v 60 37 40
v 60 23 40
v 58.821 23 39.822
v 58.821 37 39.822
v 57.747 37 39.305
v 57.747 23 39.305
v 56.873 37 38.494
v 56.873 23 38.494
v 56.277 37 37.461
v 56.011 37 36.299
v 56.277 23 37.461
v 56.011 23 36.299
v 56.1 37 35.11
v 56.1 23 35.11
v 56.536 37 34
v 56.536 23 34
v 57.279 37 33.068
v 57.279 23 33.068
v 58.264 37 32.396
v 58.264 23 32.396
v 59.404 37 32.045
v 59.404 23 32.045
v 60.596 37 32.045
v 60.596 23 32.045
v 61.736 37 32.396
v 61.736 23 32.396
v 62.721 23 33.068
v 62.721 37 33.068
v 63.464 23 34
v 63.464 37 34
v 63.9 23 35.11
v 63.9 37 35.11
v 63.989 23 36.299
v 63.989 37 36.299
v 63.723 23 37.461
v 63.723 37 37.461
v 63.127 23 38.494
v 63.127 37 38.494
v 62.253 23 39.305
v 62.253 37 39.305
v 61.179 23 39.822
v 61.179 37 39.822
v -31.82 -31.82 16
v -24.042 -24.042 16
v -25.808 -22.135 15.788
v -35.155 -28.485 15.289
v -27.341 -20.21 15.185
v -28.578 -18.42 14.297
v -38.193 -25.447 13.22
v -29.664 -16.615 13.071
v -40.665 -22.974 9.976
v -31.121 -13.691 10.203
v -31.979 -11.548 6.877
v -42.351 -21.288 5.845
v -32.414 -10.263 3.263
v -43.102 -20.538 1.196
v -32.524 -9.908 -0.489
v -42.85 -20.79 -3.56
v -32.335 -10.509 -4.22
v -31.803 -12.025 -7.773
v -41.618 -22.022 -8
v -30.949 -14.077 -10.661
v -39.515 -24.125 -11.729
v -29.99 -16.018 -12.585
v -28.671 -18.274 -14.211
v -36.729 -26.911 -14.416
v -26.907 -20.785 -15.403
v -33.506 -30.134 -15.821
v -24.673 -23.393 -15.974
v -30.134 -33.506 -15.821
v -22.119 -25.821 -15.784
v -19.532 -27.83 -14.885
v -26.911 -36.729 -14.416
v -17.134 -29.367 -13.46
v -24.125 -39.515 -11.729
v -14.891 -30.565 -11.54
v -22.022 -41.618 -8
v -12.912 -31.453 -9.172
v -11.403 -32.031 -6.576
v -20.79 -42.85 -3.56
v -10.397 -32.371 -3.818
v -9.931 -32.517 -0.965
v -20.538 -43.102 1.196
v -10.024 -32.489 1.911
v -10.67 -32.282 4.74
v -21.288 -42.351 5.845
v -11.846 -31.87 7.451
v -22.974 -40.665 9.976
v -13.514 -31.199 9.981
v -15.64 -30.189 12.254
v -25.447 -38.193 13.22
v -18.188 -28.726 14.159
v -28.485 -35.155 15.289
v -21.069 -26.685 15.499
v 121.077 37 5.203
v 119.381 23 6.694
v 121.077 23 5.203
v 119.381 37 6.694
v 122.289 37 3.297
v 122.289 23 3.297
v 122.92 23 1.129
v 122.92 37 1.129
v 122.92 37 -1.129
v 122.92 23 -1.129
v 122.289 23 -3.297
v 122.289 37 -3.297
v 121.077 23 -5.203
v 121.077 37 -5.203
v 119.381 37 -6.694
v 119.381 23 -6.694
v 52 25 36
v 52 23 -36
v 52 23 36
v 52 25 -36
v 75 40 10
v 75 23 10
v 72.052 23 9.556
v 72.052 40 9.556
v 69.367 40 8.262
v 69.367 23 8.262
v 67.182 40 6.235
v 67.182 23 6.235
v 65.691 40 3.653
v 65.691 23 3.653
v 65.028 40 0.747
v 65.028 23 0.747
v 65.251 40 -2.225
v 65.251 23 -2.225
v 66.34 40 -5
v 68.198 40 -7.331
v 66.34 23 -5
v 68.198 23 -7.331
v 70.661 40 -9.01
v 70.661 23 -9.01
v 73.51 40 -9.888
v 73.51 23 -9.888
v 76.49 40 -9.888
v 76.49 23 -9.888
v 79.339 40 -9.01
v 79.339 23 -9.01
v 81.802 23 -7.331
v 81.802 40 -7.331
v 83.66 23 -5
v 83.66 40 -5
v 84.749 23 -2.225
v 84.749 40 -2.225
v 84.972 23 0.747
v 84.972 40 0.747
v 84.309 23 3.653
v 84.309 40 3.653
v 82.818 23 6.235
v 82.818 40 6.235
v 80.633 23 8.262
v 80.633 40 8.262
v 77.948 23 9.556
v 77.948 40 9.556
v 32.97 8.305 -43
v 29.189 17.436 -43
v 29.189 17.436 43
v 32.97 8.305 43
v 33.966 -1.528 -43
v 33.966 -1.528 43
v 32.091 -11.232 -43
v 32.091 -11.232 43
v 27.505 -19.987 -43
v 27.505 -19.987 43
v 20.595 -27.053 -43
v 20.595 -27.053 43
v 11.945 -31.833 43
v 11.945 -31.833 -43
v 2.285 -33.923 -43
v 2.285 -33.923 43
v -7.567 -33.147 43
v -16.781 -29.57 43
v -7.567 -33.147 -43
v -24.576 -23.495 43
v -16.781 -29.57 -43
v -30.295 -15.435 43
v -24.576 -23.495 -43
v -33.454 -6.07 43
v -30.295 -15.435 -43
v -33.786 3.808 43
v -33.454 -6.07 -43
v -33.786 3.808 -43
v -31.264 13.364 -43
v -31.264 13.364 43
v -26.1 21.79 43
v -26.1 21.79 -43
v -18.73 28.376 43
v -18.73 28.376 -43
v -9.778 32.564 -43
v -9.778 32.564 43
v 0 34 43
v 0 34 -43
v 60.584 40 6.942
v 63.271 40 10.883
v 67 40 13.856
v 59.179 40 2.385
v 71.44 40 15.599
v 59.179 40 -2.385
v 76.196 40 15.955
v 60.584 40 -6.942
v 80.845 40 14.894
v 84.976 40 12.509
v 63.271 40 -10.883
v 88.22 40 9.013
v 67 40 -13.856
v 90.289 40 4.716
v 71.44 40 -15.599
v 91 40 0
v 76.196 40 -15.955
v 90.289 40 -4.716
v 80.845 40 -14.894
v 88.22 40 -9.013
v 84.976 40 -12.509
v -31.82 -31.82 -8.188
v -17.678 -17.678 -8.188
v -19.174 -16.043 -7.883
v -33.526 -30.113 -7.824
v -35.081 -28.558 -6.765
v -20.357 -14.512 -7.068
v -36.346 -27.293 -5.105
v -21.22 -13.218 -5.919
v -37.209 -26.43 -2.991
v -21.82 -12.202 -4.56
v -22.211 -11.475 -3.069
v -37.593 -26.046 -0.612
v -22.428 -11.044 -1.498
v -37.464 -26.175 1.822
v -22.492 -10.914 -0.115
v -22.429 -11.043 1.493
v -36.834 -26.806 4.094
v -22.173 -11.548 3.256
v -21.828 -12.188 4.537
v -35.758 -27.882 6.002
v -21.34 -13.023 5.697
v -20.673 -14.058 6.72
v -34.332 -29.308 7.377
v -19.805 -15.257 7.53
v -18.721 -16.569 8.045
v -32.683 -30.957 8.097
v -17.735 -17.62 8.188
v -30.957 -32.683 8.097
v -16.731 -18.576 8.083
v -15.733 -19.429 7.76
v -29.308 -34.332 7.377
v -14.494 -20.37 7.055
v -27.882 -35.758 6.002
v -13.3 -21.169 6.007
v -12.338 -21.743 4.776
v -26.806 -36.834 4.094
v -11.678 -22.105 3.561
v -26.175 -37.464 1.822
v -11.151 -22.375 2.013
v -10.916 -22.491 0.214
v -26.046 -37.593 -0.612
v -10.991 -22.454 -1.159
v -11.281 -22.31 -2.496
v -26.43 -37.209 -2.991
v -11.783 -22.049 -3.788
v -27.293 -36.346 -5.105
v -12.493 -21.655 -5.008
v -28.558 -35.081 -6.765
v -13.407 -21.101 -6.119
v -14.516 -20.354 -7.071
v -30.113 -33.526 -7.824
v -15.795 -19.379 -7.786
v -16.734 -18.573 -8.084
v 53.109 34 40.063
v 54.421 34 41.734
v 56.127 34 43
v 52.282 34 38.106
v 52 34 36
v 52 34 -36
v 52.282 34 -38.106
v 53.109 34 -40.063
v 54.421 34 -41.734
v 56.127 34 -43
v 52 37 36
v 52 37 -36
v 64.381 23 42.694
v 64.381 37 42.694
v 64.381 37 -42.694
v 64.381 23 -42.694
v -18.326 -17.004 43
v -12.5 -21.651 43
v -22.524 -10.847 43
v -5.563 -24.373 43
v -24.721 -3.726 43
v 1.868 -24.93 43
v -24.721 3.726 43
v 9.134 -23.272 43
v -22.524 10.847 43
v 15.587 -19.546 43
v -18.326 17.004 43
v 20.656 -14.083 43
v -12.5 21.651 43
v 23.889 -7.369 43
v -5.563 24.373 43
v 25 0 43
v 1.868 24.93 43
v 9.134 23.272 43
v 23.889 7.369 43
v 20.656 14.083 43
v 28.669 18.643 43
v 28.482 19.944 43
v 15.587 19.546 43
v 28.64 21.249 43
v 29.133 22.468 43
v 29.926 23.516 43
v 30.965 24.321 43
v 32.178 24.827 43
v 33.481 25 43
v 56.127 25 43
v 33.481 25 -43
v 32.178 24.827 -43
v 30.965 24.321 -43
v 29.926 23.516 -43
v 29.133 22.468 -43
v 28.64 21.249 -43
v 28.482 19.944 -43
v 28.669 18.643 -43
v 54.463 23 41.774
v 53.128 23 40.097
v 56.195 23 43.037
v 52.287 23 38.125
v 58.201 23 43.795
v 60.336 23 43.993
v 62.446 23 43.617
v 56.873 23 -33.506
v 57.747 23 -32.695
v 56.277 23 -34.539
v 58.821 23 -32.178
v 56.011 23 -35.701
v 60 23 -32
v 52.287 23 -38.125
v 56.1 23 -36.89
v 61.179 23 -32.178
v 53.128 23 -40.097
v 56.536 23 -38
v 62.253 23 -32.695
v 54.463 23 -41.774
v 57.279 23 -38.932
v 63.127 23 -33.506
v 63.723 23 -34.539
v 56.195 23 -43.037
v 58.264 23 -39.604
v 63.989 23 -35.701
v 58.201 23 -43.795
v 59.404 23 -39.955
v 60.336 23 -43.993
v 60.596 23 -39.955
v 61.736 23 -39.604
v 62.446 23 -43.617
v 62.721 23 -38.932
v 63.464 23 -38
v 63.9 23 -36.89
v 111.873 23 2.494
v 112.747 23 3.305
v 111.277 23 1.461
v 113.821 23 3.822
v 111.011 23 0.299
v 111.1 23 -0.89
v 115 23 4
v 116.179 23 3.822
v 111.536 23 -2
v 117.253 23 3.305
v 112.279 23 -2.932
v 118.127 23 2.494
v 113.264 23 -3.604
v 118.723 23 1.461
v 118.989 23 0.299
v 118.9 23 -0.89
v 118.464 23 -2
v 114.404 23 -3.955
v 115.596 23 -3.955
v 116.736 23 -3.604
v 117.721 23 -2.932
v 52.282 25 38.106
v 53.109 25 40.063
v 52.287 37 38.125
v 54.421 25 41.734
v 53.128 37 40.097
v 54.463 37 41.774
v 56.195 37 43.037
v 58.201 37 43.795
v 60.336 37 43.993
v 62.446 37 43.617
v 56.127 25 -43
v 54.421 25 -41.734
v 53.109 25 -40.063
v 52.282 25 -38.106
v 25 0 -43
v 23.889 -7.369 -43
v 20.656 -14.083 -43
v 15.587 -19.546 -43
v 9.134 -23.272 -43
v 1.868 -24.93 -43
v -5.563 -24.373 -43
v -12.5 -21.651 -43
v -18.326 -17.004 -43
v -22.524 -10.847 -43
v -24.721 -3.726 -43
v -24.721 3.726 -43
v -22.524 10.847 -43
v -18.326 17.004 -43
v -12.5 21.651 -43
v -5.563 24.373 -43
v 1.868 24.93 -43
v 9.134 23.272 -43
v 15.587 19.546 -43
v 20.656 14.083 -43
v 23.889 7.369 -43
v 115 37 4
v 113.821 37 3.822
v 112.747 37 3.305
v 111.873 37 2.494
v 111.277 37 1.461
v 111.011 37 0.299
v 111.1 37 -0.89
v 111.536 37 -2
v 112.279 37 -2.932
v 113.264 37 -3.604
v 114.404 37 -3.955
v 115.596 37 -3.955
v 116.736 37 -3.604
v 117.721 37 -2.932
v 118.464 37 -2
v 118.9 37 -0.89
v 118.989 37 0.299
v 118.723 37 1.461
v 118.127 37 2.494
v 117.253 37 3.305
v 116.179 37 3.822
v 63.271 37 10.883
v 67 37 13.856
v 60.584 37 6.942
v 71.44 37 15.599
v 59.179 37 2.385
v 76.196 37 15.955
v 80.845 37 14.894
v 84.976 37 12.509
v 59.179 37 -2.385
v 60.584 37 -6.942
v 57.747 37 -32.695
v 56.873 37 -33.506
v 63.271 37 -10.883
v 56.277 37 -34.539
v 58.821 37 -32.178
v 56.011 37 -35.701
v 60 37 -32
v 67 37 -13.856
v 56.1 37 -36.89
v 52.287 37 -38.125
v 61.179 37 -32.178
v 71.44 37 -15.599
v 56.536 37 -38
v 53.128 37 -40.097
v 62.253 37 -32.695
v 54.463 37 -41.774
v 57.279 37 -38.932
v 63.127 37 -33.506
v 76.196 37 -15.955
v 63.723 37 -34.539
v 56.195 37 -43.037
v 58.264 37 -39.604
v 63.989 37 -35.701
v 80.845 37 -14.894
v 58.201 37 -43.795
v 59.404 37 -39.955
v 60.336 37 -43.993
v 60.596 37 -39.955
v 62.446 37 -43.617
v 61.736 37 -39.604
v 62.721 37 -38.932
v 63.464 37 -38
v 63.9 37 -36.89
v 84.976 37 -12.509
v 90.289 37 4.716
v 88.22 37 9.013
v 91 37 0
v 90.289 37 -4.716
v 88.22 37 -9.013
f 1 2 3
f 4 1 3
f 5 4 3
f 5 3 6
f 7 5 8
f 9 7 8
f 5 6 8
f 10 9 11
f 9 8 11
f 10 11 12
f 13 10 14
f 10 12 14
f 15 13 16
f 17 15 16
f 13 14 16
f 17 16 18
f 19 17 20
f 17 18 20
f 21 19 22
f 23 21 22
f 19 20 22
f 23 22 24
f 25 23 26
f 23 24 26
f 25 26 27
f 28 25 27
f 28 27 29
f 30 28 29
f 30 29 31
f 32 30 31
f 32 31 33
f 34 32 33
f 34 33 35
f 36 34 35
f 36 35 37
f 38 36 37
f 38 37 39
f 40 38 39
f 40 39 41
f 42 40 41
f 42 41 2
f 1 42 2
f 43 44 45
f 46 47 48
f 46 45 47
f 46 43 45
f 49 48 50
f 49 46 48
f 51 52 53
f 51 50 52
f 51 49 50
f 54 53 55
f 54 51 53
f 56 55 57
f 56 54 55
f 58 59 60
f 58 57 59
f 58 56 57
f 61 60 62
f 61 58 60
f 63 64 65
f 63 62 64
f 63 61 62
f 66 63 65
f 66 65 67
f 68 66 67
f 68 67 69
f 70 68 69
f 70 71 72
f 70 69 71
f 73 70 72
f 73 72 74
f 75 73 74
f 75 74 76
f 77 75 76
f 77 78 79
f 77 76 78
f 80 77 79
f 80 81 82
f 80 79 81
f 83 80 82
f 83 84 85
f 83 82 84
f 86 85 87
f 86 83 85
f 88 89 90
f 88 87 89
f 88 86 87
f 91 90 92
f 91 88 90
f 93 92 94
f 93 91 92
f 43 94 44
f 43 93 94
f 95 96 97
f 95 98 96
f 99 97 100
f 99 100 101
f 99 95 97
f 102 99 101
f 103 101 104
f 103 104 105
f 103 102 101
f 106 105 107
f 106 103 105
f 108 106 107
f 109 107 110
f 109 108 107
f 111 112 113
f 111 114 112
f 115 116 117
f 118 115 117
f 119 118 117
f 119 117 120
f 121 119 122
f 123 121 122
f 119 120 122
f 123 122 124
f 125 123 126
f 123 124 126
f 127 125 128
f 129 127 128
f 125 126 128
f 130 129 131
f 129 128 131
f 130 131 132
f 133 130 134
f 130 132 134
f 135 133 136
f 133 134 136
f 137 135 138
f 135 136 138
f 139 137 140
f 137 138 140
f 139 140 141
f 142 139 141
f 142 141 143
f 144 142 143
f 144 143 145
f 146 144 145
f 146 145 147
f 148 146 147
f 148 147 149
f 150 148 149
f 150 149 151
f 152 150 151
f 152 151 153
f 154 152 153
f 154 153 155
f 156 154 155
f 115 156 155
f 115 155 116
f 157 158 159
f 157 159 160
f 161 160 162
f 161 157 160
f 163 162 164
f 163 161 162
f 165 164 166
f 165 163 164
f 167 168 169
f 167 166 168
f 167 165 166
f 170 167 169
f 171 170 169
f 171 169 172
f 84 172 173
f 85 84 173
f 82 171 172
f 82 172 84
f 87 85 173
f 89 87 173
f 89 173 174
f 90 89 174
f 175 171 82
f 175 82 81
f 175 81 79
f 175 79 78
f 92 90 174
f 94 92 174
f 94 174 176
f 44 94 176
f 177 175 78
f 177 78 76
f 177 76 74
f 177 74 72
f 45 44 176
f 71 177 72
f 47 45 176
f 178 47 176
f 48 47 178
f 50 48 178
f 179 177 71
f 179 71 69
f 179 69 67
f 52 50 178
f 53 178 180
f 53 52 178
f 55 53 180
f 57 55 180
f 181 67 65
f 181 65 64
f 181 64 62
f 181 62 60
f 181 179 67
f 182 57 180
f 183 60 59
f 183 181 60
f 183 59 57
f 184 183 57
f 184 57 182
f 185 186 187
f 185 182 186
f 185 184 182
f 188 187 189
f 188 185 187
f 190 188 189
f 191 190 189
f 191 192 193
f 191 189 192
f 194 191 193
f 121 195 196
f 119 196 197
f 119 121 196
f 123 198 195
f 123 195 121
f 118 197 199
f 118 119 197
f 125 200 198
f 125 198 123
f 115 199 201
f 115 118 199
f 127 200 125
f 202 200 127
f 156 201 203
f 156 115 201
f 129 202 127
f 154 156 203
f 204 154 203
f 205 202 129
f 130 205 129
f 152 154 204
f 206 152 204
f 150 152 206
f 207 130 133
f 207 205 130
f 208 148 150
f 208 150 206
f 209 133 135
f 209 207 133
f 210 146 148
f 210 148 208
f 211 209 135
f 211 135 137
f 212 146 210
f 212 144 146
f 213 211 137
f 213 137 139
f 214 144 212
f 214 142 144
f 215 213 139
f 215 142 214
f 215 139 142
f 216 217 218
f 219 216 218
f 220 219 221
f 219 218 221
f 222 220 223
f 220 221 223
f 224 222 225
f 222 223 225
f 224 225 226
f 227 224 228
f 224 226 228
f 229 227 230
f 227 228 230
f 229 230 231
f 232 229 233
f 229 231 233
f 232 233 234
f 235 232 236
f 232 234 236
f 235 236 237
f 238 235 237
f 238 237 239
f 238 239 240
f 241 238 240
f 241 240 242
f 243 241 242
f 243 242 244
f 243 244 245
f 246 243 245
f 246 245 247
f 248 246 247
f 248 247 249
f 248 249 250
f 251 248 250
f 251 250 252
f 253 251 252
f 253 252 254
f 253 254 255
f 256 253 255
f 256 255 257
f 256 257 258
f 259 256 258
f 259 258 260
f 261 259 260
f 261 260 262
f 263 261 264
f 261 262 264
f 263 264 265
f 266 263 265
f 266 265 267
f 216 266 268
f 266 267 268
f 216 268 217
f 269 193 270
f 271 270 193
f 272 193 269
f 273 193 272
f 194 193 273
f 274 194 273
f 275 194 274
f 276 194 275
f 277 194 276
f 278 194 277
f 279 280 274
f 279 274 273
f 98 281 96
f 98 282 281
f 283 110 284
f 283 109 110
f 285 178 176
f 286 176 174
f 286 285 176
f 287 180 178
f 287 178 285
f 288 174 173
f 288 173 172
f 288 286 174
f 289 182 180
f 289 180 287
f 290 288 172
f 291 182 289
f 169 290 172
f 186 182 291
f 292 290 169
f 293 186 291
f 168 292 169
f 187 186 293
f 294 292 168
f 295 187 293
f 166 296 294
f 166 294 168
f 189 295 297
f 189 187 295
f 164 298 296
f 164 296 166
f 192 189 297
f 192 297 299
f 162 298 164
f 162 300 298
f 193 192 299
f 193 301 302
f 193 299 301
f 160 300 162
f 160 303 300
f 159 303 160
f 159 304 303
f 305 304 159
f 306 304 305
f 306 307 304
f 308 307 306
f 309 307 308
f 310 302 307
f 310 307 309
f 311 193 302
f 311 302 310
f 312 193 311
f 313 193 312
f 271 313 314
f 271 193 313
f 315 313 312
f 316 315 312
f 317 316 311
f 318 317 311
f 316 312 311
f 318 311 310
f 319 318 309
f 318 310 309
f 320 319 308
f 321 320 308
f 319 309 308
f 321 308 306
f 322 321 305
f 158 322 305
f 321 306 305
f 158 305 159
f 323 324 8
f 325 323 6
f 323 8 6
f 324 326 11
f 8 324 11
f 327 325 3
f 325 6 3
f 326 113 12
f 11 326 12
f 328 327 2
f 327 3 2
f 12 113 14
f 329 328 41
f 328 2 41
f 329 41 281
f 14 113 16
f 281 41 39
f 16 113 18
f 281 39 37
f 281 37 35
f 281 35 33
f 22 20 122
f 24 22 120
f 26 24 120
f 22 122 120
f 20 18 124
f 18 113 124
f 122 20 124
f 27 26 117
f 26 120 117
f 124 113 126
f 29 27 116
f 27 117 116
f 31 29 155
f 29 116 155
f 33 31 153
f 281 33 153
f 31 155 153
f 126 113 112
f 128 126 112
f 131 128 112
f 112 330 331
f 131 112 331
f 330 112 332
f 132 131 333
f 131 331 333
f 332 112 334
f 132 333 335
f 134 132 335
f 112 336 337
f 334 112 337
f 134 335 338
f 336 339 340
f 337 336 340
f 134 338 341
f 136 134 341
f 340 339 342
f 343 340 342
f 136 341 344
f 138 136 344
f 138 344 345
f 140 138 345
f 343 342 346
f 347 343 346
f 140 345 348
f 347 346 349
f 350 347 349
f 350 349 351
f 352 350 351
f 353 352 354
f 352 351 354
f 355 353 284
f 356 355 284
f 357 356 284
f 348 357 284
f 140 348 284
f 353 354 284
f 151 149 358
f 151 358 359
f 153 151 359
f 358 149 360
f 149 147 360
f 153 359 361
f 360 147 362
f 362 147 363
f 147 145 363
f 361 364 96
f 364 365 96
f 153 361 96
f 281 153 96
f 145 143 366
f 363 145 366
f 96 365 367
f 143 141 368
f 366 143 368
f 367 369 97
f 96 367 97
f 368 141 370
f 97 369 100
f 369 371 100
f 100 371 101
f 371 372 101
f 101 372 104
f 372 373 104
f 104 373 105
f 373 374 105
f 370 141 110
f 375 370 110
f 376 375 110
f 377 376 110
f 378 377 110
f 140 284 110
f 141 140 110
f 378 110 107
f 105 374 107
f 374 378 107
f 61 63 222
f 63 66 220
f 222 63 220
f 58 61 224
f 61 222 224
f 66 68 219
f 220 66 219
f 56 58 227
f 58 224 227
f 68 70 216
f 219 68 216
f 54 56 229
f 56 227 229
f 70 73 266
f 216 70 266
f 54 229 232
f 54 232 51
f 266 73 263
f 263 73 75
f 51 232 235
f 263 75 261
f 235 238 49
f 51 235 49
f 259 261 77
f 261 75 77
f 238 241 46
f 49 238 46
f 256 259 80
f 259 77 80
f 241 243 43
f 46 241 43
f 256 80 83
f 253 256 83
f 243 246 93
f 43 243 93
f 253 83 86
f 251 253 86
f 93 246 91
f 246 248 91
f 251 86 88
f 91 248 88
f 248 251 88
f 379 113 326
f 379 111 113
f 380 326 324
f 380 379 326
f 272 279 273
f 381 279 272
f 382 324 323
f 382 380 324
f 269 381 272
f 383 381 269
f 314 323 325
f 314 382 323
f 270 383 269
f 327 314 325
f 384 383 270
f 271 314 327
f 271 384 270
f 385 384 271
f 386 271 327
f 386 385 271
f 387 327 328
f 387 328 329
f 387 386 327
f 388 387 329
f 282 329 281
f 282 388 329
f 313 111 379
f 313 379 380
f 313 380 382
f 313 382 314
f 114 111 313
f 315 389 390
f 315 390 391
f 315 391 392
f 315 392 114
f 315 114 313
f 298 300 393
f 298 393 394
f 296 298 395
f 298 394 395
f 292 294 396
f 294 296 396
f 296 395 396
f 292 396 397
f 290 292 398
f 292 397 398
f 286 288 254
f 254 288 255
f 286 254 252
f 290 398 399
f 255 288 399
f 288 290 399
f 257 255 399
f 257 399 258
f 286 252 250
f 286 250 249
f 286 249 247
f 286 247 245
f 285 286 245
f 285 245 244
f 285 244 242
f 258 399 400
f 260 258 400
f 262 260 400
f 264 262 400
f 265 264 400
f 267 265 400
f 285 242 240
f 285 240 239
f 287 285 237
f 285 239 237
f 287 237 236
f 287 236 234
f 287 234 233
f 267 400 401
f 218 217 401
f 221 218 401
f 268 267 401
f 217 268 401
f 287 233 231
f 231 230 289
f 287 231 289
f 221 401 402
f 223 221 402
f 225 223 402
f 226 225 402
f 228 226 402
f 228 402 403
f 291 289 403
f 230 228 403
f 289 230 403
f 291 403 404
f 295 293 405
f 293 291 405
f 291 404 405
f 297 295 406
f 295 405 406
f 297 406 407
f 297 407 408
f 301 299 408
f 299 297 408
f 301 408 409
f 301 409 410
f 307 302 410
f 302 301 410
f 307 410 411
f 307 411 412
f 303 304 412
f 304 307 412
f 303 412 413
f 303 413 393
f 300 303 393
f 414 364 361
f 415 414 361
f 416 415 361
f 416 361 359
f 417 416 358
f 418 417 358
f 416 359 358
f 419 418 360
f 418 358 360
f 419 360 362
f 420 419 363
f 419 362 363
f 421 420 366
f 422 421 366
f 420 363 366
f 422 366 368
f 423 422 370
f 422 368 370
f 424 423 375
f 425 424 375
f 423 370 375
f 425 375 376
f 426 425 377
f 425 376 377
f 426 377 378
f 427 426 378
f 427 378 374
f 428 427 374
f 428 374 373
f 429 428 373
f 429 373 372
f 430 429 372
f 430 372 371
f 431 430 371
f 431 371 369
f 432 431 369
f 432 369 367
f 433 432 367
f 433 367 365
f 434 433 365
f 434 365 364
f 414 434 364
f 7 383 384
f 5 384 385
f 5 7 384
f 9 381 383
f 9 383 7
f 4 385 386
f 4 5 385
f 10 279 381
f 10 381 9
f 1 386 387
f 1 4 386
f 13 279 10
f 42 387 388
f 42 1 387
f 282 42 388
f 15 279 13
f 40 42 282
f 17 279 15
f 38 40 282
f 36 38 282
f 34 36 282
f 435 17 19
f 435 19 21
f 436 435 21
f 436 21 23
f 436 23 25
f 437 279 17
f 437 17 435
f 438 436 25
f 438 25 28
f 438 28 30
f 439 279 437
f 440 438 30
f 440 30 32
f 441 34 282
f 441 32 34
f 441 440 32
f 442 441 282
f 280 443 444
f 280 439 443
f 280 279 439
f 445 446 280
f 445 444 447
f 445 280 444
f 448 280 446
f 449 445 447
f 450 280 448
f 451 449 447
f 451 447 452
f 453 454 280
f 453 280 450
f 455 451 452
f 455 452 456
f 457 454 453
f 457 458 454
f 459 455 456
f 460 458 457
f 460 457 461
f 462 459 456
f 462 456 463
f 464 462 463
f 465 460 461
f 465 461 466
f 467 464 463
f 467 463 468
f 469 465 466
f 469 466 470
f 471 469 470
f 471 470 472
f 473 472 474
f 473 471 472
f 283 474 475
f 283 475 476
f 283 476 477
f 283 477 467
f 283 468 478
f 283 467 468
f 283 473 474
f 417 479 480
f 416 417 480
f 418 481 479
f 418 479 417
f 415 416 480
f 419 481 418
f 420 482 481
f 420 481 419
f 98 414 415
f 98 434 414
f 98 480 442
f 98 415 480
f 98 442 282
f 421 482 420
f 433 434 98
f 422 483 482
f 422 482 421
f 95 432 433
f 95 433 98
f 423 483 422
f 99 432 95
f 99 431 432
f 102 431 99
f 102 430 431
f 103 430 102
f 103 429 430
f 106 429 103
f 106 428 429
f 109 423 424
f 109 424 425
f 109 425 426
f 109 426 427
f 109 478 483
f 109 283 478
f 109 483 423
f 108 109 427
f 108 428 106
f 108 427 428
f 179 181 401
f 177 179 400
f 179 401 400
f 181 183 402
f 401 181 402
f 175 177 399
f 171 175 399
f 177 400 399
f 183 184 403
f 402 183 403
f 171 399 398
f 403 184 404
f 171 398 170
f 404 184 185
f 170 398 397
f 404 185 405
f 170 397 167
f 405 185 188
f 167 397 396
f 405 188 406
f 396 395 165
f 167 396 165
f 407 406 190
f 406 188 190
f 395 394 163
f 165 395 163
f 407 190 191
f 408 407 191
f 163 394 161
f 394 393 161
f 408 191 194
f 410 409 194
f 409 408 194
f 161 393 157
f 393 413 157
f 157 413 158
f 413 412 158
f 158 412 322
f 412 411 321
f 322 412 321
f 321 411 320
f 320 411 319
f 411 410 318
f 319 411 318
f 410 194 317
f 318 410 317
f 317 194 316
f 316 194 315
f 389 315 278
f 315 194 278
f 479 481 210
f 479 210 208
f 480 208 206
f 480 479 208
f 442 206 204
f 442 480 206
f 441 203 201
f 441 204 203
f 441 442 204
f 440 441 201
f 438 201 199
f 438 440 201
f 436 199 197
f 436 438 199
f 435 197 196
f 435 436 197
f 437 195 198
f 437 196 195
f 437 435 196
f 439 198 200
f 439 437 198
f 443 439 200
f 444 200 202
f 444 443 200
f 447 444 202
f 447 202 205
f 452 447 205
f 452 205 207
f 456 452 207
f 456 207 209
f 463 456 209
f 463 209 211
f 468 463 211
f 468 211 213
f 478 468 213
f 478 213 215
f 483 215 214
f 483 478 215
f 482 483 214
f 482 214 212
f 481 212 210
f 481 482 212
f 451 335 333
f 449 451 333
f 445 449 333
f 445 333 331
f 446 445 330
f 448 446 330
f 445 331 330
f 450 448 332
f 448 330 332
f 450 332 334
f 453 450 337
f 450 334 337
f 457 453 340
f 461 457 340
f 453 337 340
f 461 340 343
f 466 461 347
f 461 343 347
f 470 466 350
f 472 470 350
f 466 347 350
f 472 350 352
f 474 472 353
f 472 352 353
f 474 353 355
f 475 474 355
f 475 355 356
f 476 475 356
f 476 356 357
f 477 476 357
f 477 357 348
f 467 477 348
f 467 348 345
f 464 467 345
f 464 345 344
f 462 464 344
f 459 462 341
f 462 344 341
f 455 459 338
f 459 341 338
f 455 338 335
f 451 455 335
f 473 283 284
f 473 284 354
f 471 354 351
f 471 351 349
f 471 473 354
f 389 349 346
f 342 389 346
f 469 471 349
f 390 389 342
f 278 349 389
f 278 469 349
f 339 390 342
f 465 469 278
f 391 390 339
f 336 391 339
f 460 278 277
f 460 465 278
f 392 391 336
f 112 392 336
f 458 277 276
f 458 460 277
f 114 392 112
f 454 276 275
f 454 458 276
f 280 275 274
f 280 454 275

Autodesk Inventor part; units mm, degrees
ref_plane "YZ Plane" through (0, 0, 0) normal (1, 0, 0) x (0, 1, 0)
sketch "Sketch1" plane through (0, 0, 0) normal (0, 0, 1) x (1, 0, 0)
  circle A0 centre (0, 0) radius 25
  arc A1 (0, 34) -> (23.0434, 25) centre (0, 0) ccw
  line L0 (0, 34) -> (60, 34)
  line L1 (60, 34) -> (60, 25)
  line L2 (60, 25) -> (23.0434, 25)
  arc A2 (23.0434, 25) -> (0, 34) centre (0, 0) ccw construction
  dimension "d1" = 68
  dimension "d2" = 50
  dimension "d3" = 9
  dimension "d4" = 60
extrude "Extrusion1" add sketch "Sketch1" along normal mid plane 86
ref_plane "Work Plane1" through (0, 37, 43) normal (0, 1, 0) x (1, 0, 0)
sketch "Sketch2" plane through (0, 37, 43) normal (0, 1, 0) x (1, 0, 0)
  line L0 (60, 79) -> (115, 43) construction
  line L1 (115, 43) -> (60, 7) construction
  line L2 (60, 7) -> (60, 79) construction
  line L3 (60, 86) -> (60, 0) projected
  line L4 (119.3813, 49.6936) -> (64.3813, 85.6936)
  line L5 (52, 79) -> (52, 7)
  line L6 (64.3813, 0.3064) -> (119.3813, 36.3064)
  arc A0 (64.3813, 85.6936) -> (52, 79) centre (60, 79) ccw
  arc A1 (52, 7) -> (64.3813, 0.3064) centre (60, 7) ccw
  arc A2 (119.3813, 36.3064) -> (119.3813, 49.6936) centre (115, 43) ccw
  point P0 (0, 43)
  dimension "d8" = 55
  dimension "d9" = 72
  dimension "d10" = 8
  dimension "d11" = 8
extrude "Extrusion2" add sketch "Sketch2" against normal blind 14
sketch "Sketch3" plane through (0, 37, 43) normal (0, 1, 0) x (1, 0, 0)
  arc A0 (64.3813, 85.6936) -> (52, 79) centre (60, 79) ccw projected
  arc A1 (52, 7) -> (64.3813, 0.3064) centre (60, 7) ccw projected
  arc A2 (119.3813, 36.3064) -> (119.3813, 49.6936) centre (115, 43) ccw projected
  point P0 (0, 43)
hole "Hole1" at (60, 37, 36) at (60, 37, -36) at (115, 37, 0) direction (0, -1, 0) diameter 8 end through all
sketch "Sketch4" plane through (0, 37, 43) normal (0, 1, 0) x (1, 0, 0)
  circle A0 centre (115, 43) radius 4 projected
  circle A1 centre (75, 43) radius 16
  point P0 (0, 43)
  dimension "d21" = 32
  dimension "d22" = 40
extrude "Extrusion3" add sketch "Sketch4" along normal blind 3 contours A1
sketch "Sketch5" plane through (75, 40, 0) normal (0, 1, 0) x (1, 0, 0)
  circle A0 centre (0, 0) radius 16 projected
  point P0 (-75, 0)
hole "Hole2" at (75, 40, 0) direction (0, -1, 0) diameter 20 end through all
ref_plane "Work Plane3" through (-31.8198, -31.8198, 0) normal (0.7071068, 0.7071068, 0) x (0, 0, 1)
ref_plane "Work Plane2" through (0, 0, 0) normal (0.7071068, 0.7071068, 0) x (0, 0, 1)
sketch "Sketch6" plane through (-31.8198, -31.8198, 0) normal (0.7071068, 0.7071068, 0) x (0, 0, 1)
  circle A0 centre (0, 0) radius 16
  dimension "d34" = 32
extrude "Extrusion4" add sketch "Sketch6" along normal up to next
sketch "Sketch7" plane through (-31.8198, -31.8198, 0) normal (-0.7071068, -0.7071068, 0) x (-0.7071068, 0.7071068, 0)
  circle A0 centre (0, 0) radius 16 projected
hole "Hole3" at (-31.8198, -31.8198, 0) direction (0.7071068, 0.7071068, 0) diameter 16.376 end up to surface thread size "M18x1.5" class "6H" standard "ISO Metric profile"
fillet "Fillet1" radius 5 1 edges at (23.0434, 25, 0)
properties part number "Part033.Pivoting connection" material "Steel, Carbon"
